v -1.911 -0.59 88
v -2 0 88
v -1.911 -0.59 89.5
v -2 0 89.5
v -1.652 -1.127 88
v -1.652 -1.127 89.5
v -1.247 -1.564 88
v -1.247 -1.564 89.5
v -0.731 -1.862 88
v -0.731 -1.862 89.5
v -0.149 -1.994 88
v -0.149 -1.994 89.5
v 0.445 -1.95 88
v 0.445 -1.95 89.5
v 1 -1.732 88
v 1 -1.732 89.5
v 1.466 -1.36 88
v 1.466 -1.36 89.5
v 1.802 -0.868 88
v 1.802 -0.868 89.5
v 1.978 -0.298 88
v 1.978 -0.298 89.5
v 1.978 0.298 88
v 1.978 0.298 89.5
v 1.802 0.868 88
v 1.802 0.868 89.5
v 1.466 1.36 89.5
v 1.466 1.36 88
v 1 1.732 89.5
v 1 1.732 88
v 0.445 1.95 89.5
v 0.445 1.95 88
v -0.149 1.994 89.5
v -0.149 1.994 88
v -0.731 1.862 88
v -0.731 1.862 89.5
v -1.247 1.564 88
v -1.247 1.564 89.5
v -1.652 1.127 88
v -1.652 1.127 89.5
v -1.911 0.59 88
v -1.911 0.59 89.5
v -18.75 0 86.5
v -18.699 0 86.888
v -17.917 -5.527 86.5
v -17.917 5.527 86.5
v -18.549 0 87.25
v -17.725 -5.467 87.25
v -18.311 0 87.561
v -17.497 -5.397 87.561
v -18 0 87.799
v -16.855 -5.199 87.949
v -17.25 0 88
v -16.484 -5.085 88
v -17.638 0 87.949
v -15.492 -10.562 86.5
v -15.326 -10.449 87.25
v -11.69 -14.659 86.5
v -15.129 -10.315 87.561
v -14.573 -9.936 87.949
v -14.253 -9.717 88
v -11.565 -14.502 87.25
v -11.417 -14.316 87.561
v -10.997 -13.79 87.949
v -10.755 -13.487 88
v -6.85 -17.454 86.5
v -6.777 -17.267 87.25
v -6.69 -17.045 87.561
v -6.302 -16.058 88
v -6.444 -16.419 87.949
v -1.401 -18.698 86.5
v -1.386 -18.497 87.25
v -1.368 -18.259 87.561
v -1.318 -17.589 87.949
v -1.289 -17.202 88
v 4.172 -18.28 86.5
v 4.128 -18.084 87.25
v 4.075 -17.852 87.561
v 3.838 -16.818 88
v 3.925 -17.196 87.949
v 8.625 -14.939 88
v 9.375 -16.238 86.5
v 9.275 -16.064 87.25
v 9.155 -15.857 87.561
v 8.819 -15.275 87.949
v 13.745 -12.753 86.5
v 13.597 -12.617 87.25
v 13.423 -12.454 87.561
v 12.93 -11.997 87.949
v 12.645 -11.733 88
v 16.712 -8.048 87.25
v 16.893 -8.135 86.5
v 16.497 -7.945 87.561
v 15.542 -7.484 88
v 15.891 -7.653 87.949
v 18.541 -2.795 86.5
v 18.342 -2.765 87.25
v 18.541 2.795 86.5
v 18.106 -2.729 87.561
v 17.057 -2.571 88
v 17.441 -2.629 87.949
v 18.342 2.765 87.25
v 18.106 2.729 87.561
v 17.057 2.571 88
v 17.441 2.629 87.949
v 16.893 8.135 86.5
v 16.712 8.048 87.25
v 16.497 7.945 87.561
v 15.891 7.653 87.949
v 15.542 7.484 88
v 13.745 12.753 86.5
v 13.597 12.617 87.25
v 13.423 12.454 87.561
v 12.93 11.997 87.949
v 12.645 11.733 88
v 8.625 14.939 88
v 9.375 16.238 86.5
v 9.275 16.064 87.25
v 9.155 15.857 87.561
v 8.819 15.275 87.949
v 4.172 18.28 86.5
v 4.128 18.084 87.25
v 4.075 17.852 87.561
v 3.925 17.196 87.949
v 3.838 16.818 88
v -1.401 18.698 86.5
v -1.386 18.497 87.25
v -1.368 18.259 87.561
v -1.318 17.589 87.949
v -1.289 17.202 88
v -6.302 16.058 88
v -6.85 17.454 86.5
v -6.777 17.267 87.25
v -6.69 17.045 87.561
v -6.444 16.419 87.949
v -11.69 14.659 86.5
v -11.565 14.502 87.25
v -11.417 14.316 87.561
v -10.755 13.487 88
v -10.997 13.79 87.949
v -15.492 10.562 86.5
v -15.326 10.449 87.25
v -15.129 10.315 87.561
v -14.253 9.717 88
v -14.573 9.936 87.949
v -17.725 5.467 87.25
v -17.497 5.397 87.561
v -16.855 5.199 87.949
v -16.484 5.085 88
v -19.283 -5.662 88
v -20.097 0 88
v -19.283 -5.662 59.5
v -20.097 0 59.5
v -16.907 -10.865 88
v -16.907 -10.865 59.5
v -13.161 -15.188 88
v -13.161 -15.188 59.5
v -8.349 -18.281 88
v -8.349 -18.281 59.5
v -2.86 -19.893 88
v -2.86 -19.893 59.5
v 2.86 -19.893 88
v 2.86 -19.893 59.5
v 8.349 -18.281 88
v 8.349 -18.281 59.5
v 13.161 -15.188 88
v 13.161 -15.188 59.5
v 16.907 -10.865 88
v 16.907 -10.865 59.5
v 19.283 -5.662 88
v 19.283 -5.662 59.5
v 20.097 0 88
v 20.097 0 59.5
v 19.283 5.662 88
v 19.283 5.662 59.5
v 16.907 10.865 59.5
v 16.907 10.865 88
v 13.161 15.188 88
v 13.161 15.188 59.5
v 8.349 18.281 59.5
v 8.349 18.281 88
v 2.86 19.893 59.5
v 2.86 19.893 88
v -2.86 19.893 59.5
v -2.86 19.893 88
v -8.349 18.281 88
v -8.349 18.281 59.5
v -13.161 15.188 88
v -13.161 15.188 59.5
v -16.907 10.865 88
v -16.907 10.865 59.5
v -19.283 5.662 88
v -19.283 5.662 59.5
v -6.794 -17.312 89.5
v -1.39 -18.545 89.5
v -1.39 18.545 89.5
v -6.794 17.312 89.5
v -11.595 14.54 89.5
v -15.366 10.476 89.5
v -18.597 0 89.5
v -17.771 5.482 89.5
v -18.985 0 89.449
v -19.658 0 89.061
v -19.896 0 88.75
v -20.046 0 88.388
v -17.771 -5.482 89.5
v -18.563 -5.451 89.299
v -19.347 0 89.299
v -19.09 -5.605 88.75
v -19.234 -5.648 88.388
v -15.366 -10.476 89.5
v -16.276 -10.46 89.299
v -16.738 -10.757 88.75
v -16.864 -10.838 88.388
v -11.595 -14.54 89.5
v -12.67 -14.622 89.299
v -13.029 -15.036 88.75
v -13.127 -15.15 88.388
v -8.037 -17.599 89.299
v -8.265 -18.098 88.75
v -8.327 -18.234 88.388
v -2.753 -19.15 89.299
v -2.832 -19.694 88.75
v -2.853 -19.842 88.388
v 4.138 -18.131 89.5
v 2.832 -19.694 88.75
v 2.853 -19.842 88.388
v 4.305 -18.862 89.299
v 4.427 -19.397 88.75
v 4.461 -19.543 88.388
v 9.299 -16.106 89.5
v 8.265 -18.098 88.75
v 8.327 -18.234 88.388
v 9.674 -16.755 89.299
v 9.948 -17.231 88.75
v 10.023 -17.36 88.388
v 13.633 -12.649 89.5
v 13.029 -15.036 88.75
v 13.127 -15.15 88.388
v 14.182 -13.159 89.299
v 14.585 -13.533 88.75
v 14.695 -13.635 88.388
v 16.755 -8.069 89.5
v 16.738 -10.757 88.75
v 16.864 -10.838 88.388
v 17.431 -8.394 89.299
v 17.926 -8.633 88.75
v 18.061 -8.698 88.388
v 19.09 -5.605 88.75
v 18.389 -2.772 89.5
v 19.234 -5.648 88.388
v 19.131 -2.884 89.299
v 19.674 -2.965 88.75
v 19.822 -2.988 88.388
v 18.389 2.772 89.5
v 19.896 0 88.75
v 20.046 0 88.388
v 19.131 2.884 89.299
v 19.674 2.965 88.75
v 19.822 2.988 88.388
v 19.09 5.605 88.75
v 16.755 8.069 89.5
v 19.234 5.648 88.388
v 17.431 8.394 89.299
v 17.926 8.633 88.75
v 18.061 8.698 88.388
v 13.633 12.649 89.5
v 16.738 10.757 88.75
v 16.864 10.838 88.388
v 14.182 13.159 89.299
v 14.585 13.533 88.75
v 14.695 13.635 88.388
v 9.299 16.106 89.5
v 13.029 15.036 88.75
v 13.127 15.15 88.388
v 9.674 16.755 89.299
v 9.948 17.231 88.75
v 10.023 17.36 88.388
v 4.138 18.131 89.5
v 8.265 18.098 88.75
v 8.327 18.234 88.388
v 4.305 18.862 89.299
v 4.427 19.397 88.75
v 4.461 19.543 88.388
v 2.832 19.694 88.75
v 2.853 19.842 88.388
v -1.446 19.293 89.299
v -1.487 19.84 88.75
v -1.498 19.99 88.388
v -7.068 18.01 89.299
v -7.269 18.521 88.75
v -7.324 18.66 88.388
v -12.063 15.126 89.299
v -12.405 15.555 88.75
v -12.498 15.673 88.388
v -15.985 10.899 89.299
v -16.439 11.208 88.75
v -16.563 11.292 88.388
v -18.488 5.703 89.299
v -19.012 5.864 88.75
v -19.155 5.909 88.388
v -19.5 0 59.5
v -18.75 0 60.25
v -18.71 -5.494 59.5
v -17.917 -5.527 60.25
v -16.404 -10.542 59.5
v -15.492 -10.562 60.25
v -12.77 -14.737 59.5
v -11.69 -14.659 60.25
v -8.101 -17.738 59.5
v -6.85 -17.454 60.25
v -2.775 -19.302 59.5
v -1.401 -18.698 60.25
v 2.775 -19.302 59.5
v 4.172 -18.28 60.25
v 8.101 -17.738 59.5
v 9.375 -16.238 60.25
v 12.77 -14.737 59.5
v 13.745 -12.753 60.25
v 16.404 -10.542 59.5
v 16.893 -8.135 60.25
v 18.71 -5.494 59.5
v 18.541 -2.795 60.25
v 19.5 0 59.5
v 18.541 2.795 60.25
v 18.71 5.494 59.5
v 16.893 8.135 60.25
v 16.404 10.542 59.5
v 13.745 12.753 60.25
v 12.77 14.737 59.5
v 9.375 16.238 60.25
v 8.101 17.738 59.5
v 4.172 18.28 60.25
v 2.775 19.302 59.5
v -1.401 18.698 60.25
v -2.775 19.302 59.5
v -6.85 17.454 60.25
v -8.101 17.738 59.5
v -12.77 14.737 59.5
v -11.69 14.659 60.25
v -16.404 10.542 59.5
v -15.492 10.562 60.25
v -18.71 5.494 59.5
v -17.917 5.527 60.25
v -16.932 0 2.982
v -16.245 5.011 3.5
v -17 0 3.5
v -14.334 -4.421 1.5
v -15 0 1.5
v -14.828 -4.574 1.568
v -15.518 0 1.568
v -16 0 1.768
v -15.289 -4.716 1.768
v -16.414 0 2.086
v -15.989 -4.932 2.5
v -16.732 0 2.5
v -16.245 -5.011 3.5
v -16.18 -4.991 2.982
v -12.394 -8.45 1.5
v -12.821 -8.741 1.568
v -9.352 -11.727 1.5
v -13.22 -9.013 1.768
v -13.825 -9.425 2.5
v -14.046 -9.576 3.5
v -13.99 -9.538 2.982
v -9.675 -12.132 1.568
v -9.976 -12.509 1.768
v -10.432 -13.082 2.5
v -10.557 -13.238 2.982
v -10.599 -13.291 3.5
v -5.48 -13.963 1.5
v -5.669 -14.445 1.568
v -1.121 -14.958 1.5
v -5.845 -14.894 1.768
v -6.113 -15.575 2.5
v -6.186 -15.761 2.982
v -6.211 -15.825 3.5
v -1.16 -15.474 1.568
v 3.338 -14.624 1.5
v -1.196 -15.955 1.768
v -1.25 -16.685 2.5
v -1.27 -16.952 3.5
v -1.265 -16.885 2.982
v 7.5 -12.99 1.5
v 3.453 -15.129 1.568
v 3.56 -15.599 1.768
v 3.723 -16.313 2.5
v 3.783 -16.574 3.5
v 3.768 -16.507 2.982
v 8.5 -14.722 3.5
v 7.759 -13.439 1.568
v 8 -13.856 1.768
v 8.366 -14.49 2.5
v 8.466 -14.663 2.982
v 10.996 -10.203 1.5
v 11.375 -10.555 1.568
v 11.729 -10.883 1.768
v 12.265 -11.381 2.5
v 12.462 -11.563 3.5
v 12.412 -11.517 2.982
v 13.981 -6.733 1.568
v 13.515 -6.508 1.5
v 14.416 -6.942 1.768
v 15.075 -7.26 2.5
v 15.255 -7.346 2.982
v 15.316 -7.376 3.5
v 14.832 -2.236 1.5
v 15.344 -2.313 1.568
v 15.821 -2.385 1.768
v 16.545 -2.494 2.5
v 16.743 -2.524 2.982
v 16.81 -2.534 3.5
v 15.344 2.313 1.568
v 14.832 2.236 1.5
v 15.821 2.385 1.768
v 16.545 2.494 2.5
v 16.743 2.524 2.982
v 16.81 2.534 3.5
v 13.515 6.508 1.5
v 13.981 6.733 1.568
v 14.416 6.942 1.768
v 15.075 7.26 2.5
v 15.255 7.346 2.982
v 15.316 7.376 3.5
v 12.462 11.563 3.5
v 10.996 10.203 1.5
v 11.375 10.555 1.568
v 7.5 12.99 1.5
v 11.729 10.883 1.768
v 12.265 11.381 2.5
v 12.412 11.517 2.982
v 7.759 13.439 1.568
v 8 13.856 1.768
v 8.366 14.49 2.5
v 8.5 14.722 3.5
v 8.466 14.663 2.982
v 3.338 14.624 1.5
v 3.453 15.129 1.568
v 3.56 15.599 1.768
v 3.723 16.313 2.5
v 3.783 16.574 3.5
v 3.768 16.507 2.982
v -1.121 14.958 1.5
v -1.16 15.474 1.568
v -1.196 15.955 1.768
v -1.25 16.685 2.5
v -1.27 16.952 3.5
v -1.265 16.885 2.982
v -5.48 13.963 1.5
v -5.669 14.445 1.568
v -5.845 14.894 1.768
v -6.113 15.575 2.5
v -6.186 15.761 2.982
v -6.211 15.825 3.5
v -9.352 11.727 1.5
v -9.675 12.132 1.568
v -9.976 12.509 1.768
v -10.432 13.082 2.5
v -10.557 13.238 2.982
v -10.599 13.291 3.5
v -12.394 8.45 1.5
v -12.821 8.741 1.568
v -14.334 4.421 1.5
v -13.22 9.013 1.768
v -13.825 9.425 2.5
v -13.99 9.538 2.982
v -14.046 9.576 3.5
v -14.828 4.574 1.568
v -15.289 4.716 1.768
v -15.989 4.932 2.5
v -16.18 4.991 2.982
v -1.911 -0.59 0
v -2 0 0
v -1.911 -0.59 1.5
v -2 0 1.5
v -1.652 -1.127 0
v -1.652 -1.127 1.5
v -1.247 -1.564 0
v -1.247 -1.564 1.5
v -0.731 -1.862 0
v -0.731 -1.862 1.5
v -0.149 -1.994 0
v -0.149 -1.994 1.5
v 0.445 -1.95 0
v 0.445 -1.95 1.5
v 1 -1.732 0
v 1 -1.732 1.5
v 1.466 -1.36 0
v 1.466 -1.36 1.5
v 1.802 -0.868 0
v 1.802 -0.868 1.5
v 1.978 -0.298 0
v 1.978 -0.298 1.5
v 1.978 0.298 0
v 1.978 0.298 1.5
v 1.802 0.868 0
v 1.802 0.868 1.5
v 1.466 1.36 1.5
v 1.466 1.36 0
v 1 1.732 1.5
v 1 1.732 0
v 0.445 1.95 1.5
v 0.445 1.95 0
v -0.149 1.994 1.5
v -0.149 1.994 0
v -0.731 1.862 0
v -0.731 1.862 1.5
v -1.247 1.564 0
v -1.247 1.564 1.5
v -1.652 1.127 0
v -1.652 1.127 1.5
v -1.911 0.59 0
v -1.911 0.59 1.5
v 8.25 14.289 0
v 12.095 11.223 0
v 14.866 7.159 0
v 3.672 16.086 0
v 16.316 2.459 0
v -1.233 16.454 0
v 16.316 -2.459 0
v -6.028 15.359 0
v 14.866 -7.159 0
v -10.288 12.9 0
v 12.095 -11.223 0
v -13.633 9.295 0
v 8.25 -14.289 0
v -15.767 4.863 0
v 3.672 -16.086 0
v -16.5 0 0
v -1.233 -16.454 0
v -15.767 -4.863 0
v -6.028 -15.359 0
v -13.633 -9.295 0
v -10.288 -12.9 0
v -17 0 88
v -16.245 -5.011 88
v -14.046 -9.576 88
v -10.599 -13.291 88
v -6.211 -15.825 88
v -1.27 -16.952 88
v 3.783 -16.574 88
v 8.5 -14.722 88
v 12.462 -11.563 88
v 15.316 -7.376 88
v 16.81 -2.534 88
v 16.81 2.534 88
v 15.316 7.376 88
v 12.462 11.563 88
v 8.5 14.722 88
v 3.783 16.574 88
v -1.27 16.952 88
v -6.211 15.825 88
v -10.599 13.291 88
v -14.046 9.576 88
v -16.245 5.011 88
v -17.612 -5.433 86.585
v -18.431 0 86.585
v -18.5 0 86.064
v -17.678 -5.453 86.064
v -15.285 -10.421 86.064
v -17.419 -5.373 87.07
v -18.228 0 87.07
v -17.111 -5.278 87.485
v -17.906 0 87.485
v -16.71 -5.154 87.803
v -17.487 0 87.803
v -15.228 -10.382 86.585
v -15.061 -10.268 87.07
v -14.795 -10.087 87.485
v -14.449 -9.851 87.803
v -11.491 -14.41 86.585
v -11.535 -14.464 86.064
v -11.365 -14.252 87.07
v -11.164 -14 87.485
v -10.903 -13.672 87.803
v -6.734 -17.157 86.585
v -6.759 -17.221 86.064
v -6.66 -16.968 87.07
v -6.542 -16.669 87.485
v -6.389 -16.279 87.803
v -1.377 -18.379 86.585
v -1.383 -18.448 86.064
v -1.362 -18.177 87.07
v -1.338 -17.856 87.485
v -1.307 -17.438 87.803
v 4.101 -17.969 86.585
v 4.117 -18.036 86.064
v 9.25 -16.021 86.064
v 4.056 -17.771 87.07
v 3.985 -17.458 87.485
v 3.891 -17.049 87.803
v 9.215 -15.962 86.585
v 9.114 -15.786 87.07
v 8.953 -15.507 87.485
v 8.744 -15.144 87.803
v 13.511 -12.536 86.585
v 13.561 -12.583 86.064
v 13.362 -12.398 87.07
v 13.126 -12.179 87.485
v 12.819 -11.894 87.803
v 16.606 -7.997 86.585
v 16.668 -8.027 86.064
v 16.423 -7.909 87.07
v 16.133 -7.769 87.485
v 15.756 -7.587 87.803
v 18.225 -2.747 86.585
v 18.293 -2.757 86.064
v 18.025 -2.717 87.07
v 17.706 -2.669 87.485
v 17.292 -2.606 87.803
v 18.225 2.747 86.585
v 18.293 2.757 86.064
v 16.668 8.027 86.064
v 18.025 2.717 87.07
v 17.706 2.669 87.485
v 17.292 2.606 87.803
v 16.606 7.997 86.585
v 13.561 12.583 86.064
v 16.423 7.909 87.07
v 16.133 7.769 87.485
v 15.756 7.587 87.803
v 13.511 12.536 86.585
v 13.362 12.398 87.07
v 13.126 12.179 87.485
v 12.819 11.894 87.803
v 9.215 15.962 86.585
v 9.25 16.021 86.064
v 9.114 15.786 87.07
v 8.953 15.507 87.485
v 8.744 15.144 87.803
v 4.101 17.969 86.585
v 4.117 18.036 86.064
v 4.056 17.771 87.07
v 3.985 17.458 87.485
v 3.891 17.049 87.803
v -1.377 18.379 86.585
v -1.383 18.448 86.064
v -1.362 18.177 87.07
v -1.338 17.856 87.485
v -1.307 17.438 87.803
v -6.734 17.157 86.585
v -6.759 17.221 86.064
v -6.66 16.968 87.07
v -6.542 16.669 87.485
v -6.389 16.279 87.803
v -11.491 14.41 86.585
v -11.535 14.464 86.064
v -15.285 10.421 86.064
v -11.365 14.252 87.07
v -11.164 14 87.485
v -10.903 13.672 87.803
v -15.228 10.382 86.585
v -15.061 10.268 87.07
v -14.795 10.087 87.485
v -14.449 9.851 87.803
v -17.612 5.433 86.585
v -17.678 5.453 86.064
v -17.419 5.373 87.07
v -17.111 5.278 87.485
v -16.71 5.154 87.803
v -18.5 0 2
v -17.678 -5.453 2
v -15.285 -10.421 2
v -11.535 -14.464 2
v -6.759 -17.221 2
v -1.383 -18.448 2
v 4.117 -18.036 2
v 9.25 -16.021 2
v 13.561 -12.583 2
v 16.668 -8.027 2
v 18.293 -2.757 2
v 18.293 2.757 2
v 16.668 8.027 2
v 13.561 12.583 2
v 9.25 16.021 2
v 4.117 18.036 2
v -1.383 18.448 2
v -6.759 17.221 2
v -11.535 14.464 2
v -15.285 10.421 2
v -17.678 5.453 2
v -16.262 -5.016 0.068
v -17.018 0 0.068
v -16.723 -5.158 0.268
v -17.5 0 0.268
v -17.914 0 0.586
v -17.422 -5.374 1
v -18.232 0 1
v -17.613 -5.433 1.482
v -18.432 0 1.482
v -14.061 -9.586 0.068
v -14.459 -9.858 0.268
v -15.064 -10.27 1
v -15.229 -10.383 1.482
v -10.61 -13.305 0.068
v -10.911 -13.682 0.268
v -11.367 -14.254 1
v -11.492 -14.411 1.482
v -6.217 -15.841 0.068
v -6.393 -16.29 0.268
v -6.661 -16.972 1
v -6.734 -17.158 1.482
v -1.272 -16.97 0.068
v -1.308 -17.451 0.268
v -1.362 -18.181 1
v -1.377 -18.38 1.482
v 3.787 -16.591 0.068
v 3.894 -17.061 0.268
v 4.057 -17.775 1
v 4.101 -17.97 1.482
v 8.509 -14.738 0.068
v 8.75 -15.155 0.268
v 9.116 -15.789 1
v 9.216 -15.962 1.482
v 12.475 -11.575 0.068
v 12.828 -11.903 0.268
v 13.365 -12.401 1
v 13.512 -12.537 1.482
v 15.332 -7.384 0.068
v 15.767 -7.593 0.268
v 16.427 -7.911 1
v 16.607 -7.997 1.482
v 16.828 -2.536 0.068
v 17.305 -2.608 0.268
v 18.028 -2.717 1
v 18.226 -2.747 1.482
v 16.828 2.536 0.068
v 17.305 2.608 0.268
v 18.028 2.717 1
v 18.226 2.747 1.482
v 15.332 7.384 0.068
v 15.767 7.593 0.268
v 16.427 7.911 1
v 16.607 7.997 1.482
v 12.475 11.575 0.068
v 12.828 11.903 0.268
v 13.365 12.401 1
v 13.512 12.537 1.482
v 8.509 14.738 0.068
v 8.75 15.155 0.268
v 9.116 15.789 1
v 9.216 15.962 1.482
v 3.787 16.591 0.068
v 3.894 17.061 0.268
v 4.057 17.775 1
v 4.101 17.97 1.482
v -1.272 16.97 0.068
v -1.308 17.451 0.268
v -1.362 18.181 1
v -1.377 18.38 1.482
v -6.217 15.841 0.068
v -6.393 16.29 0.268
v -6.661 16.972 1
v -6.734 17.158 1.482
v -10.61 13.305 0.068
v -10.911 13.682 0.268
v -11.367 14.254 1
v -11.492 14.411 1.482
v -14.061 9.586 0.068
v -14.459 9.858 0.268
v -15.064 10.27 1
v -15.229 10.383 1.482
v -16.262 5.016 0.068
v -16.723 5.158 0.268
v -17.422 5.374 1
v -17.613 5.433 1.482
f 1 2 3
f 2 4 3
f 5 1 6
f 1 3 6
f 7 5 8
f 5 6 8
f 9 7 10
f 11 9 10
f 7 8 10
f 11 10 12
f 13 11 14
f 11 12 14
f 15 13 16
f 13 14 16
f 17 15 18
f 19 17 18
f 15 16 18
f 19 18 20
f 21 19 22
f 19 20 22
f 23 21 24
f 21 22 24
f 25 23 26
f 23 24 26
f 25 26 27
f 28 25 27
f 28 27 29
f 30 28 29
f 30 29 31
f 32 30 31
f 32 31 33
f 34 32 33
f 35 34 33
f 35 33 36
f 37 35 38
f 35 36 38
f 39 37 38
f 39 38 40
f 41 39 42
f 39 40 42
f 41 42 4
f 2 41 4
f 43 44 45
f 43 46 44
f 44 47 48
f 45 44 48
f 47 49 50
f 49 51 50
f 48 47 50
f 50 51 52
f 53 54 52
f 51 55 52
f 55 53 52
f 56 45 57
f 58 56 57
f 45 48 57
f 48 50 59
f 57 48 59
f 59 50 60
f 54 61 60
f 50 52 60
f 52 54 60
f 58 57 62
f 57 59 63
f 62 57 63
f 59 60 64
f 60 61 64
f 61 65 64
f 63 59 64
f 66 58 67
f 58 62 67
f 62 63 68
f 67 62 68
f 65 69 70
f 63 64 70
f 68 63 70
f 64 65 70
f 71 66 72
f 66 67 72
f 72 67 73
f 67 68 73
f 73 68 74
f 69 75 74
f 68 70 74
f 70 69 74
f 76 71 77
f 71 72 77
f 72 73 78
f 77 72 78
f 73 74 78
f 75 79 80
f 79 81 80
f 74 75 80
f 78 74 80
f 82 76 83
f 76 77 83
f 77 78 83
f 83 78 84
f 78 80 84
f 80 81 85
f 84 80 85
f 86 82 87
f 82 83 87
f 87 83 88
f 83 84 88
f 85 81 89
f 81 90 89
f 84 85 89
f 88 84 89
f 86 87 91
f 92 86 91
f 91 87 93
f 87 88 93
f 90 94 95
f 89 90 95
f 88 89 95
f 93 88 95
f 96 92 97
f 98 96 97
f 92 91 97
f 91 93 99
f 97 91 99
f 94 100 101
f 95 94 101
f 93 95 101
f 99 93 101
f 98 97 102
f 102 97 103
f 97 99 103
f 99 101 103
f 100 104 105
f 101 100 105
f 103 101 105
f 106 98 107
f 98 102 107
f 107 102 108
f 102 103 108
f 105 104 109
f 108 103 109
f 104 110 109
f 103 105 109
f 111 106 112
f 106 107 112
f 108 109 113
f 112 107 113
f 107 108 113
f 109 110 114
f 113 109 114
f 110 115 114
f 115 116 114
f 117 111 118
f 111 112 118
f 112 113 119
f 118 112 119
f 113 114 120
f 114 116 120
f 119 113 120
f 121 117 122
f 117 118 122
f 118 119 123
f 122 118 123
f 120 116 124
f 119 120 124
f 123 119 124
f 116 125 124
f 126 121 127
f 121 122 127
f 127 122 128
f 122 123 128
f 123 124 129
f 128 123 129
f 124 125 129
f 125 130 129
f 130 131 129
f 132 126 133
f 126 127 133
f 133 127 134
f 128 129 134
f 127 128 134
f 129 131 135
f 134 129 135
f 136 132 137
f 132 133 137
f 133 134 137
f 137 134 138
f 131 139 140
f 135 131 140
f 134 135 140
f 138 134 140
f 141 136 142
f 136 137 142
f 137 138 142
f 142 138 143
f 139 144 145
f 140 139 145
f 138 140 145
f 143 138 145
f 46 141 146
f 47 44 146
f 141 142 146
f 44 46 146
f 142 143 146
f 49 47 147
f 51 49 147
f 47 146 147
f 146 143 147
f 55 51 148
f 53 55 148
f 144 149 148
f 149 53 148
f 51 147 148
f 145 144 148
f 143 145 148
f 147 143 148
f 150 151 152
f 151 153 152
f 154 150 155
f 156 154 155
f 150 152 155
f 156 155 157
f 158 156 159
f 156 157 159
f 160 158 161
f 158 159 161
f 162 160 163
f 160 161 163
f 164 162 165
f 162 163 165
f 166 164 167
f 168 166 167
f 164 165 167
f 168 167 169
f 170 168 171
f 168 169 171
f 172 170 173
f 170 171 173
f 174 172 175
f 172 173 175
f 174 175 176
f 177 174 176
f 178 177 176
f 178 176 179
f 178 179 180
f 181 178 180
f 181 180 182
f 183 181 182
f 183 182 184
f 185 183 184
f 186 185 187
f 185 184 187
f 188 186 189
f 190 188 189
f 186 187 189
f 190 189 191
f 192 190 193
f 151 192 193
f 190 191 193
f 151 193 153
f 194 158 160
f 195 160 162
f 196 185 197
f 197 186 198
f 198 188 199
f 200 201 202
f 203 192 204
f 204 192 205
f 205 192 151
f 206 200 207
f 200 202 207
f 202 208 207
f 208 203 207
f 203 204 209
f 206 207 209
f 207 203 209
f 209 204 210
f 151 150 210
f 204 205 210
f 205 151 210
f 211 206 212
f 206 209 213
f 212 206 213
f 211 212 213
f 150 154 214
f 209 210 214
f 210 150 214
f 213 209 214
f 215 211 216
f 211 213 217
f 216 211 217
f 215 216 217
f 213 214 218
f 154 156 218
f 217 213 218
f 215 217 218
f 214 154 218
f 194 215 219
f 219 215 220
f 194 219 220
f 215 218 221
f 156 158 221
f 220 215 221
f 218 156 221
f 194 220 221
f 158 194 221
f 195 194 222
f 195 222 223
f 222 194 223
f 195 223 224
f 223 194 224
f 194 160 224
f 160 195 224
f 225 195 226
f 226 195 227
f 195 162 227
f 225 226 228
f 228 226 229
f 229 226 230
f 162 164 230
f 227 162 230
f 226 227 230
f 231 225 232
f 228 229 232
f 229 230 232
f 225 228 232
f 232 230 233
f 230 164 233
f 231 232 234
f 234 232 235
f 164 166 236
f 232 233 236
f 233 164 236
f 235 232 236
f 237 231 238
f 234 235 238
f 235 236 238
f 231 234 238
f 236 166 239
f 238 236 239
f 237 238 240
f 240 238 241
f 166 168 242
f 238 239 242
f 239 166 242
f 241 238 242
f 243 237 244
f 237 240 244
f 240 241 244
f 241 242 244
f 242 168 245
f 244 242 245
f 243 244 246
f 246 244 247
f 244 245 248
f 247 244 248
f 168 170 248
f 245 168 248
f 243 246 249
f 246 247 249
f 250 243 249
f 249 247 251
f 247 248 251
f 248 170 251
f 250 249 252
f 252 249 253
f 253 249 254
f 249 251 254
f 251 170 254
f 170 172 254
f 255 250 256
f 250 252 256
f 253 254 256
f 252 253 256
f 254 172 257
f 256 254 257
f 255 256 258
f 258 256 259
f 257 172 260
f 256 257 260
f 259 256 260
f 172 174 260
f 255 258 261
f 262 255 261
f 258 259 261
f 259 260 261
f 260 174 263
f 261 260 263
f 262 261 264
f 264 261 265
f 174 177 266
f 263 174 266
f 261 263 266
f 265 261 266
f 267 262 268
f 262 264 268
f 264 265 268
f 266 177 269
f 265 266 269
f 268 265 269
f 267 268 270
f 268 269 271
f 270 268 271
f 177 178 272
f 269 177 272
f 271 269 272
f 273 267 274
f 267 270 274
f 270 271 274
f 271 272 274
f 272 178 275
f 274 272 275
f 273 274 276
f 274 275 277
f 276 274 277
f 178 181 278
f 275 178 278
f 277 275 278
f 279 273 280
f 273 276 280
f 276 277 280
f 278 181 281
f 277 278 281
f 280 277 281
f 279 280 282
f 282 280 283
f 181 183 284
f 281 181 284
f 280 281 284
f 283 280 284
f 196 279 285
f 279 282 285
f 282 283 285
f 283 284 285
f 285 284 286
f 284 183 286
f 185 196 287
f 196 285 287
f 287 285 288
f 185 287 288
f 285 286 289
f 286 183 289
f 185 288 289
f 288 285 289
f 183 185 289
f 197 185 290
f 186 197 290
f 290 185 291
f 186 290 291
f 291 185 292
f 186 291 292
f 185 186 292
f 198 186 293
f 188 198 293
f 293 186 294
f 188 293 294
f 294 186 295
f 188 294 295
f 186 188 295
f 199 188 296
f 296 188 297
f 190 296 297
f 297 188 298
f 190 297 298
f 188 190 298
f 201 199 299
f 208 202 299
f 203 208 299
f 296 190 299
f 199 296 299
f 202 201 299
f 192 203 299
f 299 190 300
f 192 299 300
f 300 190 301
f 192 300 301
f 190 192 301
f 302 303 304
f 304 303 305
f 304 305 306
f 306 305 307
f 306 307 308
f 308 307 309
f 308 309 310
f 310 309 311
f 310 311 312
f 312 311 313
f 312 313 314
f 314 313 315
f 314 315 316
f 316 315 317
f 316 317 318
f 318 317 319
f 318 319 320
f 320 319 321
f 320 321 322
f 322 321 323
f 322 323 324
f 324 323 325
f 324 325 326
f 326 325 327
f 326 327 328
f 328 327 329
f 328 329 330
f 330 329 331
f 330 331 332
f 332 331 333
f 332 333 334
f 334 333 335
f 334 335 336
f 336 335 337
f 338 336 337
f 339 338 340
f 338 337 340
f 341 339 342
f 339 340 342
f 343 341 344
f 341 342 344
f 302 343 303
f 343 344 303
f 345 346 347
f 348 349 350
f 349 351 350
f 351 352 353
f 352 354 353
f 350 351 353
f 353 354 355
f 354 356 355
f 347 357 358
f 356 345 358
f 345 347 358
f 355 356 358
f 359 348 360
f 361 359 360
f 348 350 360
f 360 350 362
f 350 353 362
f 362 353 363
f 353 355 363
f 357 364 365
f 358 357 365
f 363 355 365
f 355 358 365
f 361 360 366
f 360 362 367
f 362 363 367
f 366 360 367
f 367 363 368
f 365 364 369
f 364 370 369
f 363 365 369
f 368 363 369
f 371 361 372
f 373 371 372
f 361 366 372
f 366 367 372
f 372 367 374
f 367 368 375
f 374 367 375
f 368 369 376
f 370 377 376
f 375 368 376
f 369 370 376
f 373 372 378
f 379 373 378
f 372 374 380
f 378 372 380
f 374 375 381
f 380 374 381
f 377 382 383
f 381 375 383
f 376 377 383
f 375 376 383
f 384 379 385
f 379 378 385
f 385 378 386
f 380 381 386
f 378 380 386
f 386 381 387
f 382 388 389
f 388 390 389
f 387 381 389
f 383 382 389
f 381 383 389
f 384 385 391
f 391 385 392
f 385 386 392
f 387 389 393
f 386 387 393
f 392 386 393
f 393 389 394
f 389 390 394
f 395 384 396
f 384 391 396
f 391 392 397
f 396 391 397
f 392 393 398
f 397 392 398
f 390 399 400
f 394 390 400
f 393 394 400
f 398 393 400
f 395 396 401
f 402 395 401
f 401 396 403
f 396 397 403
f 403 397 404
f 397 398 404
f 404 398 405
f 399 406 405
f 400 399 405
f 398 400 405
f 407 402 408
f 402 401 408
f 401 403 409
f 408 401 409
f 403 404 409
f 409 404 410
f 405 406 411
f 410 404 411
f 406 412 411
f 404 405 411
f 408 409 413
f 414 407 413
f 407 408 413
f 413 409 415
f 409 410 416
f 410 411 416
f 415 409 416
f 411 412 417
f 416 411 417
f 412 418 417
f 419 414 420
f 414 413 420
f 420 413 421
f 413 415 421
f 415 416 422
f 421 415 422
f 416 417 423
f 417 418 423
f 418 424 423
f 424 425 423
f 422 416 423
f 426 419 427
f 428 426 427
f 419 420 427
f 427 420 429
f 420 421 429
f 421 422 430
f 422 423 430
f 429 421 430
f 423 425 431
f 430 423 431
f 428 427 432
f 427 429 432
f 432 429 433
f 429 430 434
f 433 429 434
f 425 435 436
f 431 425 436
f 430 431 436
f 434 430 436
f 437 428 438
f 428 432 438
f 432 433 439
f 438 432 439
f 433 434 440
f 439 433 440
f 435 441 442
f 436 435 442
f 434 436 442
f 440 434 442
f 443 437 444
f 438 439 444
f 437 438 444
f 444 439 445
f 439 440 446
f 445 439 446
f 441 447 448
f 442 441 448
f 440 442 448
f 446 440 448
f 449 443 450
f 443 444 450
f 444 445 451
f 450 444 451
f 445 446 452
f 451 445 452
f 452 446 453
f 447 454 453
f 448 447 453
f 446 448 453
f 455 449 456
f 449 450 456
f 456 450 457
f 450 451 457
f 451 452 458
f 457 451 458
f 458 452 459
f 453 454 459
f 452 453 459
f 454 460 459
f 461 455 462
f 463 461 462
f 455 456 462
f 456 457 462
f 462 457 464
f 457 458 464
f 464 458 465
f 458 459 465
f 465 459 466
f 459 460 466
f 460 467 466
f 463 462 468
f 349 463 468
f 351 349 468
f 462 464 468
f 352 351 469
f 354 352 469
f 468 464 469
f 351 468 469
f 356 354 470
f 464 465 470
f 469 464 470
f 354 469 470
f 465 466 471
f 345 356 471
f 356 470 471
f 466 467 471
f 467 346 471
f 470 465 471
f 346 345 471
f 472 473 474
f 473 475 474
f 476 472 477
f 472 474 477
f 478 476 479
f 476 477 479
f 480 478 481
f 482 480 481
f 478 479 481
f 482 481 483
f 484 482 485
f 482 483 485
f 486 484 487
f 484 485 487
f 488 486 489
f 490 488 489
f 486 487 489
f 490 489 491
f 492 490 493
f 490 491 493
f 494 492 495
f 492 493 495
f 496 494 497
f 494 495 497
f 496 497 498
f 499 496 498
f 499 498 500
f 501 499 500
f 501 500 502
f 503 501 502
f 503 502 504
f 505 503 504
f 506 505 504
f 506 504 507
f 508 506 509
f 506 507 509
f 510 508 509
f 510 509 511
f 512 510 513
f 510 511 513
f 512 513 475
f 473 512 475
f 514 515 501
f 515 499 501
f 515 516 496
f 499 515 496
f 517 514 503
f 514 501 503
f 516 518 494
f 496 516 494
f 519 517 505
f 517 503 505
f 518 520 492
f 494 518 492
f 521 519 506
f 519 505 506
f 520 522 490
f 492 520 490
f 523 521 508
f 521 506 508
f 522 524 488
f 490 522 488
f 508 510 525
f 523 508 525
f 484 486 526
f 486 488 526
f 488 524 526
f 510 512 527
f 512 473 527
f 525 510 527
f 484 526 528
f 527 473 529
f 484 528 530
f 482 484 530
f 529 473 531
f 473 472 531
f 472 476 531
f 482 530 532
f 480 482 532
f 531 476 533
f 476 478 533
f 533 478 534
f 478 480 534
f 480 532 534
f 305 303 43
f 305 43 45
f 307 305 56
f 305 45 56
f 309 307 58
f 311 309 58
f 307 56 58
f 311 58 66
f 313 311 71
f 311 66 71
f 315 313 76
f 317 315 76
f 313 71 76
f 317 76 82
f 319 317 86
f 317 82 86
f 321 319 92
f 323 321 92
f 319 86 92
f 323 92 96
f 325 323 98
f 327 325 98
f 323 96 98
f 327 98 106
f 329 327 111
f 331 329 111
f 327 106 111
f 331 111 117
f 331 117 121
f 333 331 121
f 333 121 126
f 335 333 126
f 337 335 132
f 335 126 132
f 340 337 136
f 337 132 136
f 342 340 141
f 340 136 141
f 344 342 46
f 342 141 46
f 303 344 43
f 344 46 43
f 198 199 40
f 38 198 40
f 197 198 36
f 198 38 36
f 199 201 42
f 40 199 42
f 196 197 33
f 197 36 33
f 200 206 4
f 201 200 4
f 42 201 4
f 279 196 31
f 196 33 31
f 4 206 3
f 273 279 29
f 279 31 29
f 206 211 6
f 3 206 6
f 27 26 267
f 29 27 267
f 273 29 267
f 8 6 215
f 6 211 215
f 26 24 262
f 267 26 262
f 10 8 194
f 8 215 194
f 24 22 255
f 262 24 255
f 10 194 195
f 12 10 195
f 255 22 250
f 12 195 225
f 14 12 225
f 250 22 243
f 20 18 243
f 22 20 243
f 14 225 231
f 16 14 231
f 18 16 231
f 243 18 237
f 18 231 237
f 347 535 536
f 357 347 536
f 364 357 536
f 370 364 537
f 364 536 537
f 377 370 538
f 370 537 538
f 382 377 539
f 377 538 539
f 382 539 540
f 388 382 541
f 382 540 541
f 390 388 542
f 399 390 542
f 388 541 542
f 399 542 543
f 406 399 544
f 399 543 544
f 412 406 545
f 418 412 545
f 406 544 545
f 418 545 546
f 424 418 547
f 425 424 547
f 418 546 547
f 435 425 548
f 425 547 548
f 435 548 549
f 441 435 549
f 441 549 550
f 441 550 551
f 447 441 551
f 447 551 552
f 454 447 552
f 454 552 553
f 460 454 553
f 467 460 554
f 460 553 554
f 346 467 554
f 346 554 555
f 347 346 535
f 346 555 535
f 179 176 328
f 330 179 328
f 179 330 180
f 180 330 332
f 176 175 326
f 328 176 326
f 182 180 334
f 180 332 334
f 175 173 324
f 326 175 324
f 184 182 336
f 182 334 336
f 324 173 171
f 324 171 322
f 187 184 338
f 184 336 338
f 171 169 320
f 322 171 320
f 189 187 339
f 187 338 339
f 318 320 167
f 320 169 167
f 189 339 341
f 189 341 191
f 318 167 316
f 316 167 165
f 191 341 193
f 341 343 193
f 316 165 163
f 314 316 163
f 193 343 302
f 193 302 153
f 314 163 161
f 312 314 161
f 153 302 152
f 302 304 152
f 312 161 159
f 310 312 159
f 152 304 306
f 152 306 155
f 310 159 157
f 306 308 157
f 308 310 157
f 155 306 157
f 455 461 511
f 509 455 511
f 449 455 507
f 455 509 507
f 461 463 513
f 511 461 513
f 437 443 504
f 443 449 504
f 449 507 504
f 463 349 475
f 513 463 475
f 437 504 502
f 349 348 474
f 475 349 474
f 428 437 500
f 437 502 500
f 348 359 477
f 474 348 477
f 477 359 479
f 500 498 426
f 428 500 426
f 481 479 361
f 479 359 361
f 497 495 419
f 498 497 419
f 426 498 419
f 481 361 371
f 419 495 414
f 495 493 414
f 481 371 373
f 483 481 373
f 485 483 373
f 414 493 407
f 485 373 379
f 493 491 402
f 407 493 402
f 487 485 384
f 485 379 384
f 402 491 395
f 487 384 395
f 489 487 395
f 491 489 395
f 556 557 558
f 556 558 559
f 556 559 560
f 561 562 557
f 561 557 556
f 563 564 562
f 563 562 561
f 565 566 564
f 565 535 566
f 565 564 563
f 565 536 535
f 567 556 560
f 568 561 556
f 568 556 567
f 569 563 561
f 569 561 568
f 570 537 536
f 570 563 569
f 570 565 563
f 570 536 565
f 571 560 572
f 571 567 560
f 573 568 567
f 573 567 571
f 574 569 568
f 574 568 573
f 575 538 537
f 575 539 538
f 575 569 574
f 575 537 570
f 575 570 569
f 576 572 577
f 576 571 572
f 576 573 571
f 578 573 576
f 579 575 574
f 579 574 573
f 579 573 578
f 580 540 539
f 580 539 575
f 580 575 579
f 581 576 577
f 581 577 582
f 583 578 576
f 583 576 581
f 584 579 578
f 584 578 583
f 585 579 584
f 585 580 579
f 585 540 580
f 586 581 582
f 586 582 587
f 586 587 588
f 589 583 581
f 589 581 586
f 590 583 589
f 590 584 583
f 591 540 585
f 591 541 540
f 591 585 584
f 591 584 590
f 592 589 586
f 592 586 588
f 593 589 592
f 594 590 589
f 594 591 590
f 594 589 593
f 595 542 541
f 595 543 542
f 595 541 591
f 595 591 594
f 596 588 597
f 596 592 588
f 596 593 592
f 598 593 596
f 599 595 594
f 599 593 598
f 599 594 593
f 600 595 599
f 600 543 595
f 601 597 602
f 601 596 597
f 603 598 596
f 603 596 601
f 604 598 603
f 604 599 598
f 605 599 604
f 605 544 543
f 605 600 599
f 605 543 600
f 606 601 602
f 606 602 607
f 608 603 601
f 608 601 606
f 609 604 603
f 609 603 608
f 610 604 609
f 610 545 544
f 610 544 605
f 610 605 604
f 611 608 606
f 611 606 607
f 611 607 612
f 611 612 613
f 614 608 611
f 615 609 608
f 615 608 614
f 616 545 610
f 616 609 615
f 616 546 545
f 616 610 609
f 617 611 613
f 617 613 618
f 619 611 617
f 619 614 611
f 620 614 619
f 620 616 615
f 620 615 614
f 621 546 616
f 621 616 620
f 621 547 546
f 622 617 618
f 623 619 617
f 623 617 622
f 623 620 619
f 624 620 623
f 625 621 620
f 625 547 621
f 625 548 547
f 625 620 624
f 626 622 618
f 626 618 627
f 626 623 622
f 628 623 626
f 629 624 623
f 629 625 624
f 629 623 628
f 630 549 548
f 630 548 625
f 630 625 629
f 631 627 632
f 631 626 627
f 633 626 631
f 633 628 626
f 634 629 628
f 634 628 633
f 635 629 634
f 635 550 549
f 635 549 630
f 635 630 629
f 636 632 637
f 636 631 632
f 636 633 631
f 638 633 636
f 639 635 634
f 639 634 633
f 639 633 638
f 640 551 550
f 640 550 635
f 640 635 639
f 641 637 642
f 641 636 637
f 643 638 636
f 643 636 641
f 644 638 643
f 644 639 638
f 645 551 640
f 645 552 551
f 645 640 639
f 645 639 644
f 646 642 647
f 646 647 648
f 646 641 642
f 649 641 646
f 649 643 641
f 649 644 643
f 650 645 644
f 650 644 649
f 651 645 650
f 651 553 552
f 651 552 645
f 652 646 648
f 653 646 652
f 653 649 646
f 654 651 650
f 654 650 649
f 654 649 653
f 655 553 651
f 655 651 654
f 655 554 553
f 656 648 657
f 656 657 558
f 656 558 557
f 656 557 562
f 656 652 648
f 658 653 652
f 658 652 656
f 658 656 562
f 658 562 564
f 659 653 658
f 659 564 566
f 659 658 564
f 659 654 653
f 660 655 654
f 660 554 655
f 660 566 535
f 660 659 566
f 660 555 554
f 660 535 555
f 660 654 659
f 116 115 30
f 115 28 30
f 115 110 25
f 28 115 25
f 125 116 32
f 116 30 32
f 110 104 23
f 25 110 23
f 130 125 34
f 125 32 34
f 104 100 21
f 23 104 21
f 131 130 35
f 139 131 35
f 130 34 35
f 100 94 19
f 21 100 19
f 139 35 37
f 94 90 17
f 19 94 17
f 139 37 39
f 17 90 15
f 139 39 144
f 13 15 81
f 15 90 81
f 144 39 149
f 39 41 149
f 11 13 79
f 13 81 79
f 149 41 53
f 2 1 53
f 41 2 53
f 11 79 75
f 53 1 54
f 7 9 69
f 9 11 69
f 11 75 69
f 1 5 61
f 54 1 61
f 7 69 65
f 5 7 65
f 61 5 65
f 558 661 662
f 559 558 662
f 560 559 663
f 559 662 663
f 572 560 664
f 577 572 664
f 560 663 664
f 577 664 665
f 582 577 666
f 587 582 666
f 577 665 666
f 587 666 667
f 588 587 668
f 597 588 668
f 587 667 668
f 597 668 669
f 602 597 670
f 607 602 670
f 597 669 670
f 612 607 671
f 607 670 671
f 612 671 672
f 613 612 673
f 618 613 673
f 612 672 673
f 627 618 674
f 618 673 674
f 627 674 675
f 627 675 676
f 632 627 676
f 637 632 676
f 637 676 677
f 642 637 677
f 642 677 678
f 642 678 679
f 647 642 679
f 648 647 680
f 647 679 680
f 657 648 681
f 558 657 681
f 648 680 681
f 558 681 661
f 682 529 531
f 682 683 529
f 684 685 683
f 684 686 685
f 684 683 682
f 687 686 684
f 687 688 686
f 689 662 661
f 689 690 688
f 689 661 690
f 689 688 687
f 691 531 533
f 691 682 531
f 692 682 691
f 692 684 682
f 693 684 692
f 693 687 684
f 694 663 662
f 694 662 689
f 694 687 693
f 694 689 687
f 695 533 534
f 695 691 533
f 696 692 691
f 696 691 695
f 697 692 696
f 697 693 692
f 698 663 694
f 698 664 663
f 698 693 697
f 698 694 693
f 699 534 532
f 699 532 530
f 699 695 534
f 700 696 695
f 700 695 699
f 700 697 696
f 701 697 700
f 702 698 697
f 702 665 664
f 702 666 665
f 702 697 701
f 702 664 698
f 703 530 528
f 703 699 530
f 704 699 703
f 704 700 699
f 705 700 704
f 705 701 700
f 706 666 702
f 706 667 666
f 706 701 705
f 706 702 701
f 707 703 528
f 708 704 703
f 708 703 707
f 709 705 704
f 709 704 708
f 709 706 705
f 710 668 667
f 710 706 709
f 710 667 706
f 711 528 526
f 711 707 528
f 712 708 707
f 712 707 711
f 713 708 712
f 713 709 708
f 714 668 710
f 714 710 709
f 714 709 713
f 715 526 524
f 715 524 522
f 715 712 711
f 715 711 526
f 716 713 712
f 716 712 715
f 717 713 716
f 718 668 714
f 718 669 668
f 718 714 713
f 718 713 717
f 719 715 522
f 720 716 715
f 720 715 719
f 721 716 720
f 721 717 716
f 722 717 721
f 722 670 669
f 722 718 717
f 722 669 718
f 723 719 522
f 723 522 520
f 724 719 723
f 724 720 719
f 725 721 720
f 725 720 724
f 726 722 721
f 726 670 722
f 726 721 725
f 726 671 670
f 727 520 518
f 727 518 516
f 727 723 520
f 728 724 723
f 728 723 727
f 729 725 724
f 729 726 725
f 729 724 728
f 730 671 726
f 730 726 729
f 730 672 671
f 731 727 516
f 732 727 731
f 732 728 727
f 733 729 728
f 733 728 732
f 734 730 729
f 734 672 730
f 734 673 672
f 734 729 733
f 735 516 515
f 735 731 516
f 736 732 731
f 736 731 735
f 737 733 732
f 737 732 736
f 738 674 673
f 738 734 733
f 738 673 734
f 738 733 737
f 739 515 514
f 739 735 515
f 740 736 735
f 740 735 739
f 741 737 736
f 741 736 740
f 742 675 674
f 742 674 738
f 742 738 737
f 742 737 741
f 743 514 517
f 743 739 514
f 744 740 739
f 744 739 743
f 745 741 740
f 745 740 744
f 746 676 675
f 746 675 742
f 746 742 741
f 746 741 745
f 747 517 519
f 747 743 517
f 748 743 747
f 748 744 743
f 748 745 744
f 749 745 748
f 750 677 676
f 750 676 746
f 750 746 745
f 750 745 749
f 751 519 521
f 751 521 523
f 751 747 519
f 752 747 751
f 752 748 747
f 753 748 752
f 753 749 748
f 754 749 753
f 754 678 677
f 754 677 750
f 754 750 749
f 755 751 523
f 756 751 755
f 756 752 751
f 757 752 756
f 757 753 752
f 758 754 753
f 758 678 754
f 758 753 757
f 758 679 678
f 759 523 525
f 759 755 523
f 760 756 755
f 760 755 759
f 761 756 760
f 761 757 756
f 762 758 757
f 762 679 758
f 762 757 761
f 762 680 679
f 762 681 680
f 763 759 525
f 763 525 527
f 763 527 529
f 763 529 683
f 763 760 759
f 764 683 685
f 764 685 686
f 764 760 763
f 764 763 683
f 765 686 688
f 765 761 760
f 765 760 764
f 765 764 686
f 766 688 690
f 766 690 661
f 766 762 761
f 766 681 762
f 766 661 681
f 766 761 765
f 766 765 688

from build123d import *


# Not quite as in the source:
# - a fillet or chamfer that OpenCascade refuses, or shapes differently, is made with other operations: its cross-section is extruded or revolved along the edge and cut away or added


with BuildPart() as f1:
    # F0 (on Front) → F1 (revolve)
    with BuildSketch(Plane.XZ):
        Polygon((-2, 0), (-2, 1.5), (-17, 1.5), (-17, 88), (-18.5, 88), (-18.5, 0), align=None)
    revolve(axis=Axis((0, 0, 38.7278981507), (0, 0, 1)))

    # F2: fillet of radius 2 on 3 edges, made by hand

    # F2_s1 → F2_t2 (revolve)
    with BuildSketch(Plane.XZ):
        with BuildLine():
            ThreePointArc((-15, 1.5), (-16.4142135624, 2.0857864376), (-17, 3.5))
            Line((-17, 3.5), (-17, 1.5))
            Line((-17, 1.5), (-15, 1.5))
        make_face()
    revolve(axis=Axis((0, 0, 1.5), (0, 0, 1)))

    # F2_s3 → F2_t4 (revolve, cut)
    with BuildSketch(Plane.XZ):
        with BuildLine():
            ThreePointArc((-18.5, 86.0635083269), (-18.0811388301, 87.2882531983), (-17, 88))
            Line((-17, 88), (-18.5, 88))
            Line((-18.5, 88), (-18.5, 86.0635083269))
        make_face()
    revolve(axis=Axis((0, 0, 88), (0, 0, 1)), mode=Mode.SUBTRACT)

    # F2_s5 → F2_t6 (revolve, cut)
    with BuildSketch(Plane.XZ):
        with BuildLine():
            ThreePointArc((-16.5, 0), (-17.9142135624, 0.5857864376), (-18.5, 2))
            Line((-18.5, 2), (-18.5, 0))
            Line((-18.5, 0), (-16.5, 0))
        make_face()
    revolve(axis=Axis((0, 0, 0), (0, 0, 1)), mode=Mode.SUBTRACT)


with BuildPart() as f4:
    # F3 (on Front) → F4 (revolve)
    with BuildSketch(Plane.XZ):
        with BuildLine():
            Line((-20.0970838815, 88), (-20.0970838815, 59.5))
            Line((-20.0970838815, 59.5), (-19.5, 59.5))
            Line((-19.5, 59.5), (-18.75, 60.25))
            Line((-18.75, 60.25), (-18.75, 86.5))
            ThreePointArc((-18.75, 86.5), (-18.3106601718, 87.5606601718), (-17.25, 88))
            Line((-17.25, 88), (-2, 88))
            Line((-2, 88), (-2, 89.5))
            Line((-2, 89.5), (-18.5970838815, 89.5))
            ThreePointArc((-18.5970838815, 89.5), (-19.6577440533, 89.0606601718), (-20.0970838815, 88))
        make_face()
    revolve(axis=Axis((0, 0, 24.4026009697), (0, 0, 1)))


solid = Compound([f1.part, f4.part])
